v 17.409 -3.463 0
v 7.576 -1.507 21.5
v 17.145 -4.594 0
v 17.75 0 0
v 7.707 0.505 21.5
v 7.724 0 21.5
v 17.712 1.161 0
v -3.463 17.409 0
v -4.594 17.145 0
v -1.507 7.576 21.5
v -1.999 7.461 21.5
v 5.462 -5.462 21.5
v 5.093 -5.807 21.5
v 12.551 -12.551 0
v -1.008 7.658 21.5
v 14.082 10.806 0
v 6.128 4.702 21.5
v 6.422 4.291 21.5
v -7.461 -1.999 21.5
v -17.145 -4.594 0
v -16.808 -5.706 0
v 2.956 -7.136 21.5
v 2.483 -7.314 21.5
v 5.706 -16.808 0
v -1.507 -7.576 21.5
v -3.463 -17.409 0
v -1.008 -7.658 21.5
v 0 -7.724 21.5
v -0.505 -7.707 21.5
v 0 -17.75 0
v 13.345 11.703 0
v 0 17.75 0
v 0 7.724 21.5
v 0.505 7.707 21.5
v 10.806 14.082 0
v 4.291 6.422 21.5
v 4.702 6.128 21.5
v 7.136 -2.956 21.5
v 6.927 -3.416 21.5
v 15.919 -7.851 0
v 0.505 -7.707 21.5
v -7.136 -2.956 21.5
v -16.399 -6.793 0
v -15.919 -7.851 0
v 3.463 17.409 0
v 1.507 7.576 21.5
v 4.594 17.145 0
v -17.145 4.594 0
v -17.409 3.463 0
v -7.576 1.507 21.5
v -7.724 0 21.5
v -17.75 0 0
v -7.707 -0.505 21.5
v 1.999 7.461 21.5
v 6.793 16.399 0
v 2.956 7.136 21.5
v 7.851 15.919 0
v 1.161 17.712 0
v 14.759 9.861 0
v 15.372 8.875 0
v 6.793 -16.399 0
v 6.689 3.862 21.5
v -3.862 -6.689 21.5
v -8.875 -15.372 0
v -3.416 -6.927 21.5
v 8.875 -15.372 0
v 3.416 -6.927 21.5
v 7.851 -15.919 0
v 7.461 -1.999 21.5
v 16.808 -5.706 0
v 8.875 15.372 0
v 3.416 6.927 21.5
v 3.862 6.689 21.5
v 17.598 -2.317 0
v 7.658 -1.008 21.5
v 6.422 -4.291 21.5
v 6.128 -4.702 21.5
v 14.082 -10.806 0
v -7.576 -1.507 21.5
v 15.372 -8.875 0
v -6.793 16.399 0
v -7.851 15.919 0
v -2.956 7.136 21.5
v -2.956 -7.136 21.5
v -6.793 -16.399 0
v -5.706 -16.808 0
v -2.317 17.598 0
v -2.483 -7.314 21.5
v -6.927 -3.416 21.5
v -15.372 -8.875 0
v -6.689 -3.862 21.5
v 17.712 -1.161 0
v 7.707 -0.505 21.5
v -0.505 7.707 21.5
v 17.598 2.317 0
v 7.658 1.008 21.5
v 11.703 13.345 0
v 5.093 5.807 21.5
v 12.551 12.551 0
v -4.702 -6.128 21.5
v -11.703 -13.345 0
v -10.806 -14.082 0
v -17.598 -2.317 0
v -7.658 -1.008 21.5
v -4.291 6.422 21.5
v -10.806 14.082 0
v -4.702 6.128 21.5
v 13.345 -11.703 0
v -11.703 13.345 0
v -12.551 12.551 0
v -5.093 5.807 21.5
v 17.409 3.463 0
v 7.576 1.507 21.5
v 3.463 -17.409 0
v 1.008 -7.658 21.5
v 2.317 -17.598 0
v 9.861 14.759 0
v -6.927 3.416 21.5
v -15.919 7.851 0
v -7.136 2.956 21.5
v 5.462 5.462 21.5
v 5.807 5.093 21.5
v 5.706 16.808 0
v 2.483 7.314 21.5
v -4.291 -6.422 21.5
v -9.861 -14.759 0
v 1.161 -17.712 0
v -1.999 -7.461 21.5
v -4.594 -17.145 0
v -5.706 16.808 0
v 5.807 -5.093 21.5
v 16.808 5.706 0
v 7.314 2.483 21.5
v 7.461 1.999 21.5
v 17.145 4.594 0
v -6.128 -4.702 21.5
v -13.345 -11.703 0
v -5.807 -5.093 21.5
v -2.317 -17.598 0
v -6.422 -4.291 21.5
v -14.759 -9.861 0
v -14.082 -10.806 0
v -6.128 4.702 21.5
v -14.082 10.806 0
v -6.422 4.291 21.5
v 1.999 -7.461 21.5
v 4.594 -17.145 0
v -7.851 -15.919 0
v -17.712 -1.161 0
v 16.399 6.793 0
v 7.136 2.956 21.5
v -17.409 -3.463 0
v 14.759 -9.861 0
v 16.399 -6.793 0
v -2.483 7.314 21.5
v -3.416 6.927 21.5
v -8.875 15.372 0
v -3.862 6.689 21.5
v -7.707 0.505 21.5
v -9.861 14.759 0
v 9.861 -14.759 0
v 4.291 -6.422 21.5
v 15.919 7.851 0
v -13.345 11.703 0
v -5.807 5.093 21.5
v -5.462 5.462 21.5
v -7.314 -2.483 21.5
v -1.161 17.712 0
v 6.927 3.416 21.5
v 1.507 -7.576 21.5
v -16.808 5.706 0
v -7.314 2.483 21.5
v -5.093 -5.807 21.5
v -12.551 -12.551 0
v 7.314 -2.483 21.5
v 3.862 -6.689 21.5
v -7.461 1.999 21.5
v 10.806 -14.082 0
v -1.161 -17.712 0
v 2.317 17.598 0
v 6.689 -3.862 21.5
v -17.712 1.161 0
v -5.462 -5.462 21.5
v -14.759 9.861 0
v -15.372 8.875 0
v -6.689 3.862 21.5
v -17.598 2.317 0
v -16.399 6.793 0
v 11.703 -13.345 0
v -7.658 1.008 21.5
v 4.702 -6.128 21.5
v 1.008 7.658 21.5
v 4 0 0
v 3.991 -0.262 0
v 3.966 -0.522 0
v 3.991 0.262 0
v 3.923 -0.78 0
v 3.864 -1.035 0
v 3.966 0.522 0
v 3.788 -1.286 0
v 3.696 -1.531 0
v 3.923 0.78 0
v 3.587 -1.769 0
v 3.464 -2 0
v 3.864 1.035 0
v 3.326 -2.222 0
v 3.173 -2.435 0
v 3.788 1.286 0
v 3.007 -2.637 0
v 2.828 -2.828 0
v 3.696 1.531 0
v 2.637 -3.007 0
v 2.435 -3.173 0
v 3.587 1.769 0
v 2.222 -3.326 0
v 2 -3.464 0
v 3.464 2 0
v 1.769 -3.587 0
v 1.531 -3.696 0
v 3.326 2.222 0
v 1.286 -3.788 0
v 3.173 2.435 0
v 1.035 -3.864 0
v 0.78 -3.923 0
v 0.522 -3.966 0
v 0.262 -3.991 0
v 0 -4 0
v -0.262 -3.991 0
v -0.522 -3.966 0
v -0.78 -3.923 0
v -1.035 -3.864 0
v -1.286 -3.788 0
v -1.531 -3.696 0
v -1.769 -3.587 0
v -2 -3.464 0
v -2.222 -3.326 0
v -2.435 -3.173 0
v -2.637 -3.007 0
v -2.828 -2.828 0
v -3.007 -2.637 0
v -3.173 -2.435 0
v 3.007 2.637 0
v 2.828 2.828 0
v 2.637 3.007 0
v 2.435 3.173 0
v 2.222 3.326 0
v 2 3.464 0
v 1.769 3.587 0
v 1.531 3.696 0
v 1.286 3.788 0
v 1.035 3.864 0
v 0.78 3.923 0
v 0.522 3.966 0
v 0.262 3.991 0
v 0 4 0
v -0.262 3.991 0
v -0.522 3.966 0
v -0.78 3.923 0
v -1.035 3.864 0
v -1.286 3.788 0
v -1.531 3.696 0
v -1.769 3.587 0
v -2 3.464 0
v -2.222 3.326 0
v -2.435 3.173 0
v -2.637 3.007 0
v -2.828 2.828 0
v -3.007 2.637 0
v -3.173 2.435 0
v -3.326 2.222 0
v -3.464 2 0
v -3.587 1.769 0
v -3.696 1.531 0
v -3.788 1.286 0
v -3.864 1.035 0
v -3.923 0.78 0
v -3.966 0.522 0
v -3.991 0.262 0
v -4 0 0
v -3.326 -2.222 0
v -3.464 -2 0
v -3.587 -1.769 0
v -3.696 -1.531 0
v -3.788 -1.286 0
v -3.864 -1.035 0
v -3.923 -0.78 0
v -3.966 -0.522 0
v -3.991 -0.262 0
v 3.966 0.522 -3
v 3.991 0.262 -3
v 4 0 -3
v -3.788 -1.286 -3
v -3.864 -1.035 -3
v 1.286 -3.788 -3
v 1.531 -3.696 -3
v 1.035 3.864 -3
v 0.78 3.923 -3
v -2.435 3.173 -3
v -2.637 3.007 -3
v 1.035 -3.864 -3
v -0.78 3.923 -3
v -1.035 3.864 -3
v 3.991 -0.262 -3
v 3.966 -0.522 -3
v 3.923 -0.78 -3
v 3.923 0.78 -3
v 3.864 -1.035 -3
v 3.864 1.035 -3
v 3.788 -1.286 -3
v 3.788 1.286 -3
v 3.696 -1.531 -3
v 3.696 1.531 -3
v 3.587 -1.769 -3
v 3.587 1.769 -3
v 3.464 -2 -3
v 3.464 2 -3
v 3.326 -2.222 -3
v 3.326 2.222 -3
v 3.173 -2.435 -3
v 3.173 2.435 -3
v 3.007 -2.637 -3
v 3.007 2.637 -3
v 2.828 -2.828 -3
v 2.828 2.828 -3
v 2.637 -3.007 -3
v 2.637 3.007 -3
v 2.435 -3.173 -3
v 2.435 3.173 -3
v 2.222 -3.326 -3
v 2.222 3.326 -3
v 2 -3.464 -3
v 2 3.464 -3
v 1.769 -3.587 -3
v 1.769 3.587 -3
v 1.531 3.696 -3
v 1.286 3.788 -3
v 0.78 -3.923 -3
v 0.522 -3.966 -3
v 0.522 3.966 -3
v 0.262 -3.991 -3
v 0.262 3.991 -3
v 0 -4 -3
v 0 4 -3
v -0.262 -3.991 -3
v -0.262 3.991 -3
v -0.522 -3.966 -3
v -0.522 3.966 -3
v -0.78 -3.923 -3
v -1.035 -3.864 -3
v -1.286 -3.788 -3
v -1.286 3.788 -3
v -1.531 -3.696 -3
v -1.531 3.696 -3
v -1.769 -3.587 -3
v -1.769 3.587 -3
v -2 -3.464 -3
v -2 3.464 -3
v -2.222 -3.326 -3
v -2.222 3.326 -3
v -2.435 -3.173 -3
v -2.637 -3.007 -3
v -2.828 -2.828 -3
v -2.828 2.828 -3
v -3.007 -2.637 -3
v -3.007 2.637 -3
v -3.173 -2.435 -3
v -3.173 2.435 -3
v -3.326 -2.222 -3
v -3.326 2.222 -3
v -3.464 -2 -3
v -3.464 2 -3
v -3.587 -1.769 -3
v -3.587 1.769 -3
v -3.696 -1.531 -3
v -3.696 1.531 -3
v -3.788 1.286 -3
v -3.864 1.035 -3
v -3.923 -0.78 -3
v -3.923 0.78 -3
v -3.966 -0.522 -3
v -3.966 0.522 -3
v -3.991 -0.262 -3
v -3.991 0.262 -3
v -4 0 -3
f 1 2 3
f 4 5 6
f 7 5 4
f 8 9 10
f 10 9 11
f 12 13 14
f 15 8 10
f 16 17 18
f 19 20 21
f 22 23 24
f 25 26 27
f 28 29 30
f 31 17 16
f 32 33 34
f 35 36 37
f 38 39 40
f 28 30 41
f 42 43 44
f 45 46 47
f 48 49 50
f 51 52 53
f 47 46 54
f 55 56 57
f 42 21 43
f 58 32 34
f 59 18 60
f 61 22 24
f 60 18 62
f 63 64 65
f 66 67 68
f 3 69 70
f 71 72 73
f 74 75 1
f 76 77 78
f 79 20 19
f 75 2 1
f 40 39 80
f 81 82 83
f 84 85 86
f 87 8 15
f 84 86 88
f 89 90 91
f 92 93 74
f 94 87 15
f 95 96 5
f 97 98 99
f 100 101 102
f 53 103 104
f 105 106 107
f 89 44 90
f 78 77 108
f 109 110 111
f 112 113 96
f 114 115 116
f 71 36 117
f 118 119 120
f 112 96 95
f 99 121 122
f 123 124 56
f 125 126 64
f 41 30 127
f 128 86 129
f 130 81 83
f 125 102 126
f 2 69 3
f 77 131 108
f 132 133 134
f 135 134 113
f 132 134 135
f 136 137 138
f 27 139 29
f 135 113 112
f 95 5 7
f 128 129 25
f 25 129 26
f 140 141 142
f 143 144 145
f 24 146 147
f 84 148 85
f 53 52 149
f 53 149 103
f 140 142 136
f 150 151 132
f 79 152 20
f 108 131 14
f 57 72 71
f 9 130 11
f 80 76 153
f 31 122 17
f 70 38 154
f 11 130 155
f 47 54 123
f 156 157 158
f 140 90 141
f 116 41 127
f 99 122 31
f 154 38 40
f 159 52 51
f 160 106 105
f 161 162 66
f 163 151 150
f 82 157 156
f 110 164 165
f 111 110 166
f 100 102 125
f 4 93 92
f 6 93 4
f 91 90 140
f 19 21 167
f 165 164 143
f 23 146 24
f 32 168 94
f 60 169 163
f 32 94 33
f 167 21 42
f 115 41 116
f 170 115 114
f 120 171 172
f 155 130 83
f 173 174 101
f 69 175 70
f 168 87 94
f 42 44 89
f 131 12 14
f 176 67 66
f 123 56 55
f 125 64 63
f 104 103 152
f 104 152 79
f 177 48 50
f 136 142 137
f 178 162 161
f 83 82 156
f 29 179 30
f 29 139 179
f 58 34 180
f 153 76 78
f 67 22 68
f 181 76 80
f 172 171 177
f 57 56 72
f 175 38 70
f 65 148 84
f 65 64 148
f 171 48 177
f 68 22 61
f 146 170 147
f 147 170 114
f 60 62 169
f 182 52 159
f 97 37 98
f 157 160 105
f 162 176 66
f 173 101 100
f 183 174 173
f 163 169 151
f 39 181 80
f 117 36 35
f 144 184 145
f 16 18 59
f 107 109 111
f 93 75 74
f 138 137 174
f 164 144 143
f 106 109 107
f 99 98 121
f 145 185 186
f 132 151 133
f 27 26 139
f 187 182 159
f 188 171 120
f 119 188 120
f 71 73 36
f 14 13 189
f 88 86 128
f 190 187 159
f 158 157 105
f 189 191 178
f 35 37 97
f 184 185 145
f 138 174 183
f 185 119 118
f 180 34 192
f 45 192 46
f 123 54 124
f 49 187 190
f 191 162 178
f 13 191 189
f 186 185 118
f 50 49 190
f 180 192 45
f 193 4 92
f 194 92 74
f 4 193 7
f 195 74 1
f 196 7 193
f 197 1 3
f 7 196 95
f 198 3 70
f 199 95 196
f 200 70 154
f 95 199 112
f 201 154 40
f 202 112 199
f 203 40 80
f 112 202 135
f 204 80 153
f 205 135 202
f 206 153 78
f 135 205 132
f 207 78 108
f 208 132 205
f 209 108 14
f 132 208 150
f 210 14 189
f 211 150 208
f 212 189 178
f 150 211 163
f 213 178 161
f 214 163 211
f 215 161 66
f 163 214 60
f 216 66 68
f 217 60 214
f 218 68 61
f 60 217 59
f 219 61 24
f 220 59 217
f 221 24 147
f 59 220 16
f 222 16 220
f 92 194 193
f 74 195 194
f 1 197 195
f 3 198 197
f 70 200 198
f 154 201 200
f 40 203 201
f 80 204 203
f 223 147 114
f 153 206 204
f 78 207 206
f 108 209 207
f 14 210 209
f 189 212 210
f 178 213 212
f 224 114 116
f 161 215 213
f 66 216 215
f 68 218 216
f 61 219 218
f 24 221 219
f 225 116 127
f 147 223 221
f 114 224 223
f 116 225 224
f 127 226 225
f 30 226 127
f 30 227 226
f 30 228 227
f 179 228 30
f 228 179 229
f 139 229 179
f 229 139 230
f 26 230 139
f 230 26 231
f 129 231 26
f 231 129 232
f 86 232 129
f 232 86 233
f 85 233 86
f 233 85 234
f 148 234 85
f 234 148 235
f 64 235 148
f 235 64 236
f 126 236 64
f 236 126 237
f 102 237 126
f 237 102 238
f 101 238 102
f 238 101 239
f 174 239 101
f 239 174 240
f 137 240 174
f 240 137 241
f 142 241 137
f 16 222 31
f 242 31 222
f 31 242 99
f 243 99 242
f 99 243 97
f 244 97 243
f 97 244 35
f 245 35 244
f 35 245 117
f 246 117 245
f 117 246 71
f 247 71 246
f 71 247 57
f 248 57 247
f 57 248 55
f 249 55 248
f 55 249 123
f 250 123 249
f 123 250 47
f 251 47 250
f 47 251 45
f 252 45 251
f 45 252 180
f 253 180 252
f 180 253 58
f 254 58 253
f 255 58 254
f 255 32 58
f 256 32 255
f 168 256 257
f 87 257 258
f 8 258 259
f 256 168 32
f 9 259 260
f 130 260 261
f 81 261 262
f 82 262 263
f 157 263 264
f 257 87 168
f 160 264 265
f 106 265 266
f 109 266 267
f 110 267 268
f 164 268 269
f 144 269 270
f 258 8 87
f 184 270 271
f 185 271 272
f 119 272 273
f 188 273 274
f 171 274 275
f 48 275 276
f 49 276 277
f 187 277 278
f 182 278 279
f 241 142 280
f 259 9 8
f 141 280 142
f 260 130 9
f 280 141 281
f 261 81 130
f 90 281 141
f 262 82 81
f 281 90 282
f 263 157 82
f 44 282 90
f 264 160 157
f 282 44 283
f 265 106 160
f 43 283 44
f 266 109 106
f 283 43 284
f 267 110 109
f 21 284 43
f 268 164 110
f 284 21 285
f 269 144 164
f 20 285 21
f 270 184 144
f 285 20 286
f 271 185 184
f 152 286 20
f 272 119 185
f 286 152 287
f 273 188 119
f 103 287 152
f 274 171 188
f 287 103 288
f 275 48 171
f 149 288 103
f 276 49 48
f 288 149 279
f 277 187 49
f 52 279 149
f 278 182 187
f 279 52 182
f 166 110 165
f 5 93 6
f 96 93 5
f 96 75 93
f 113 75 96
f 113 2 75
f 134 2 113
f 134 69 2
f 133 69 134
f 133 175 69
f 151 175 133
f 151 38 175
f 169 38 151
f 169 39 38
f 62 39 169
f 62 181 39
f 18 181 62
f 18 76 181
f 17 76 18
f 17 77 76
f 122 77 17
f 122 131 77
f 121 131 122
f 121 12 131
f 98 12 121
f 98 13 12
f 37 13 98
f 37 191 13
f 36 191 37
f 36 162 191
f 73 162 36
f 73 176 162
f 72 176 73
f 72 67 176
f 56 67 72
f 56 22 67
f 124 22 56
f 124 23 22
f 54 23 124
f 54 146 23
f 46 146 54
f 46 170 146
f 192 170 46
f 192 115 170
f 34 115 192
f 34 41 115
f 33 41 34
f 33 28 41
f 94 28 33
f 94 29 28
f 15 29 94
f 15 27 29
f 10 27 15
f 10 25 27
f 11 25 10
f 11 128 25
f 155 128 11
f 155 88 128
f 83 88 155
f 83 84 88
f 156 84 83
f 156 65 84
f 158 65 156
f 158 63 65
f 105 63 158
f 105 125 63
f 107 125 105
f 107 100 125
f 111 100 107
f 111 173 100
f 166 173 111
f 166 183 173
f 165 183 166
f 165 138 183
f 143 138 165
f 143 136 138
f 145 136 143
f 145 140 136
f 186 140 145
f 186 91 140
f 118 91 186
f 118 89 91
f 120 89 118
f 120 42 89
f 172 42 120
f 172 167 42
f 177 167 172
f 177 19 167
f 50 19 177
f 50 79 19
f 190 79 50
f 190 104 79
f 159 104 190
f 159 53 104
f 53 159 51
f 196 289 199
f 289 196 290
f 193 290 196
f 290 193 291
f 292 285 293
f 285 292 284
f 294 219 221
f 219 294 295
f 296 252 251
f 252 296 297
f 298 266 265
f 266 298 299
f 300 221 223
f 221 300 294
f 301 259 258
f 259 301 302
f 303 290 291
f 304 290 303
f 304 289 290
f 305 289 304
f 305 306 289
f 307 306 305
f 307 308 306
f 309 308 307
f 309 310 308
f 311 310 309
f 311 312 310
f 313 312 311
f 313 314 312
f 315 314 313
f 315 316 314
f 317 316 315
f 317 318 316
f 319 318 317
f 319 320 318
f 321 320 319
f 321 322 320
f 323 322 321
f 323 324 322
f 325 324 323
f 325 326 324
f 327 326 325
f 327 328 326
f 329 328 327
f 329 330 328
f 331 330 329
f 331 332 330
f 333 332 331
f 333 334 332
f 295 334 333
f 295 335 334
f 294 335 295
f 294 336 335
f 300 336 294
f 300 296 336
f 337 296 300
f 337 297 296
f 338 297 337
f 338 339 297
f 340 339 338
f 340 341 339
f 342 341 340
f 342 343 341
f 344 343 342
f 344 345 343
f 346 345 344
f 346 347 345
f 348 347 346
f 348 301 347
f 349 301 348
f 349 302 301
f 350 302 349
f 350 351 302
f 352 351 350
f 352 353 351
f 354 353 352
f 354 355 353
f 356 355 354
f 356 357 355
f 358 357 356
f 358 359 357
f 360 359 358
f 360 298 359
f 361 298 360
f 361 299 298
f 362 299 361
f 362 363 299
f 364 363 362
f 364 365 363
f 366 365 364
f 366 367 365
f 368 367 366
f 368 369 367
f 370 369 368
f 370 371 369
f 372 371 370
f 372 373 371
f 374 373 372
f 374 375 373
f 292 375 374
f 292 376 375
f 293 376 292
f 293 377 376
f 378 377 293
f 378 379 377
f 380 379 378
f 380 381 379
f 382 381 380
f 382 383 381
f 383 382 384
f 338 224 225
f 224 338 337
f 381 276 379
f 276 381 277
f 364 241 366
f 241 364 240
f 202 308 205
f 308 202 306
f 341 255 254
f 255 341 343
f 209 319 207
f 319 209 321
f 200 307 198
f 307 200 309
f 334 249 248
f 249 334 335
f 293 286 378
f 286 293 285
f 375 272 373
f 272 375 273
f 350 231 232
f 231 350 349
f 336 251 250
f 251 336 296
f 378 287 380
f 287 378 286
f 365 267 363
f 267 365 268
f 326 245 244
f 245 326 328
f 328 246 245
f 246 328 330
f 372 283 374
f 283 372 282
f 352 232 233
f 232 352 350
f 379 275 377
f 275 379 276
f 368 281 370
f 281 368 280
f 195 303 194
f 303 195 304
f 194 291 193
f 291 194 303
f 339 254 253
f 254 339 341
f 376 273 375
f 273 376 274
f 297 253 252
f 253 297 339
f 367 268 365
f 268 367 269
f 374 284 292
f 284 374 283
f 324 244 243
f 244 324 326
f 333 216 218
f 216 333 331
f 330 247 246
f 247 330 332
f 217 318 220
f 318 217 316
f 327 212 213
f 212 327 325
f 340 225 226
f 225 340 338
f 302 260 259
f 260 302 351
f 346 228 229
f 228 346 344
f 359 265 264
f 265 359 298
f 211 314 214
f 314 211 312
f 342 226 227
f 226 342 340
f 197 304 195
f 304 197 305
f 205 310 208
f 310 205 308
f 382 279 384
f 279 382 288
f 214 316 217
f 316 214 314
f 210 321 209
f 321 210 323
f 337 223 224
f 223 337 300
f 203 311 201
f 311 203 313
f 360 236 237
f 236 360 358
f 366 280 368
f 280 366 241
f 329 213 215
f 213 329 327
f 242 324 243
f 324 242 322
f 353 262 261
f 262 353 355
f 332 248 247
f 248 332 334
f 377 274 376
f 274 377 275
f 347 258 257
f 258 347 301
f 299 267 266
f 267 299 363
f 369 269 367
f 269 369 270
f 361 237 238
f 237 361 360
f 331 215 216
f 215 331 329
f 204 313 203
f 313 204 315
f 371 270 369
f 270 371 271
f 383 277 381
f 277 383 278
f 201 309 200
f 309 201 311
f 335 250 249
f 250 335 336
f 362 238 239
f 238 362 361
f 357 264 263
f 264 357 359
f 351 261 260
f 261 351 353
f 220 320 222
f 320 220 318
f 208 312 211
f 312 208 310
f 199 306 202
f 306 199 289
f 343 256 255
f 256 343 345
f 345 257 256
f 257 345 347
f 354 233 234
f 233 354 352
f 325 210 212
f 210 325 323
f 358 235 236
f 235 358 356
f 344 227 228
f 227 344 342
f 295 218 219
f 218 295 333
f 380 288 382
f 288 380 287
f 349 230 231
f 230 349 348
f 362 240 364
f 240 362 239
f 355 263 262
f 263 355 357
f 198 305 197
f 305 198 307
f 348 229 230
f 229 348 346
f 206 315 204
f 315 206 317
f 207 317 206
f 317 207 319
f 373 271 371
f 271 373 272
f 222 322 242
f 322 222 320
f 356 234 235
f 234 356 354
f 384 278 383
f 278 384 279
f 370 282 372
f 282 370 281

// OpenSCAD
// Locating cone of the ARES_Mauer floor guides - generated by tools/make_guides.py from config/station.toml
// [guides] (edit the config and regenerate rather than this file). Use orientation: base on the MDF strip,
// peg down into the peg hole; PRINT upside down (narrow top on the bed, peg up). Units mm.
$fn = 96;
H = 21.500;          // [guides] locator_h
R_BASE = 17.750;    // socket cone at the stone's underside - clearance
R_TOP = 7.724;     // the same cone at H
PEG_D = 8.000;
PEG_LEN = 3.000;

cylinder(h = H, r1 = R_BASE, r2 = R_TOP);
translate([0, 0, -PEG_LEN]) cylinder(h = PEG_LEN + 0.5, d = PEG_D);
